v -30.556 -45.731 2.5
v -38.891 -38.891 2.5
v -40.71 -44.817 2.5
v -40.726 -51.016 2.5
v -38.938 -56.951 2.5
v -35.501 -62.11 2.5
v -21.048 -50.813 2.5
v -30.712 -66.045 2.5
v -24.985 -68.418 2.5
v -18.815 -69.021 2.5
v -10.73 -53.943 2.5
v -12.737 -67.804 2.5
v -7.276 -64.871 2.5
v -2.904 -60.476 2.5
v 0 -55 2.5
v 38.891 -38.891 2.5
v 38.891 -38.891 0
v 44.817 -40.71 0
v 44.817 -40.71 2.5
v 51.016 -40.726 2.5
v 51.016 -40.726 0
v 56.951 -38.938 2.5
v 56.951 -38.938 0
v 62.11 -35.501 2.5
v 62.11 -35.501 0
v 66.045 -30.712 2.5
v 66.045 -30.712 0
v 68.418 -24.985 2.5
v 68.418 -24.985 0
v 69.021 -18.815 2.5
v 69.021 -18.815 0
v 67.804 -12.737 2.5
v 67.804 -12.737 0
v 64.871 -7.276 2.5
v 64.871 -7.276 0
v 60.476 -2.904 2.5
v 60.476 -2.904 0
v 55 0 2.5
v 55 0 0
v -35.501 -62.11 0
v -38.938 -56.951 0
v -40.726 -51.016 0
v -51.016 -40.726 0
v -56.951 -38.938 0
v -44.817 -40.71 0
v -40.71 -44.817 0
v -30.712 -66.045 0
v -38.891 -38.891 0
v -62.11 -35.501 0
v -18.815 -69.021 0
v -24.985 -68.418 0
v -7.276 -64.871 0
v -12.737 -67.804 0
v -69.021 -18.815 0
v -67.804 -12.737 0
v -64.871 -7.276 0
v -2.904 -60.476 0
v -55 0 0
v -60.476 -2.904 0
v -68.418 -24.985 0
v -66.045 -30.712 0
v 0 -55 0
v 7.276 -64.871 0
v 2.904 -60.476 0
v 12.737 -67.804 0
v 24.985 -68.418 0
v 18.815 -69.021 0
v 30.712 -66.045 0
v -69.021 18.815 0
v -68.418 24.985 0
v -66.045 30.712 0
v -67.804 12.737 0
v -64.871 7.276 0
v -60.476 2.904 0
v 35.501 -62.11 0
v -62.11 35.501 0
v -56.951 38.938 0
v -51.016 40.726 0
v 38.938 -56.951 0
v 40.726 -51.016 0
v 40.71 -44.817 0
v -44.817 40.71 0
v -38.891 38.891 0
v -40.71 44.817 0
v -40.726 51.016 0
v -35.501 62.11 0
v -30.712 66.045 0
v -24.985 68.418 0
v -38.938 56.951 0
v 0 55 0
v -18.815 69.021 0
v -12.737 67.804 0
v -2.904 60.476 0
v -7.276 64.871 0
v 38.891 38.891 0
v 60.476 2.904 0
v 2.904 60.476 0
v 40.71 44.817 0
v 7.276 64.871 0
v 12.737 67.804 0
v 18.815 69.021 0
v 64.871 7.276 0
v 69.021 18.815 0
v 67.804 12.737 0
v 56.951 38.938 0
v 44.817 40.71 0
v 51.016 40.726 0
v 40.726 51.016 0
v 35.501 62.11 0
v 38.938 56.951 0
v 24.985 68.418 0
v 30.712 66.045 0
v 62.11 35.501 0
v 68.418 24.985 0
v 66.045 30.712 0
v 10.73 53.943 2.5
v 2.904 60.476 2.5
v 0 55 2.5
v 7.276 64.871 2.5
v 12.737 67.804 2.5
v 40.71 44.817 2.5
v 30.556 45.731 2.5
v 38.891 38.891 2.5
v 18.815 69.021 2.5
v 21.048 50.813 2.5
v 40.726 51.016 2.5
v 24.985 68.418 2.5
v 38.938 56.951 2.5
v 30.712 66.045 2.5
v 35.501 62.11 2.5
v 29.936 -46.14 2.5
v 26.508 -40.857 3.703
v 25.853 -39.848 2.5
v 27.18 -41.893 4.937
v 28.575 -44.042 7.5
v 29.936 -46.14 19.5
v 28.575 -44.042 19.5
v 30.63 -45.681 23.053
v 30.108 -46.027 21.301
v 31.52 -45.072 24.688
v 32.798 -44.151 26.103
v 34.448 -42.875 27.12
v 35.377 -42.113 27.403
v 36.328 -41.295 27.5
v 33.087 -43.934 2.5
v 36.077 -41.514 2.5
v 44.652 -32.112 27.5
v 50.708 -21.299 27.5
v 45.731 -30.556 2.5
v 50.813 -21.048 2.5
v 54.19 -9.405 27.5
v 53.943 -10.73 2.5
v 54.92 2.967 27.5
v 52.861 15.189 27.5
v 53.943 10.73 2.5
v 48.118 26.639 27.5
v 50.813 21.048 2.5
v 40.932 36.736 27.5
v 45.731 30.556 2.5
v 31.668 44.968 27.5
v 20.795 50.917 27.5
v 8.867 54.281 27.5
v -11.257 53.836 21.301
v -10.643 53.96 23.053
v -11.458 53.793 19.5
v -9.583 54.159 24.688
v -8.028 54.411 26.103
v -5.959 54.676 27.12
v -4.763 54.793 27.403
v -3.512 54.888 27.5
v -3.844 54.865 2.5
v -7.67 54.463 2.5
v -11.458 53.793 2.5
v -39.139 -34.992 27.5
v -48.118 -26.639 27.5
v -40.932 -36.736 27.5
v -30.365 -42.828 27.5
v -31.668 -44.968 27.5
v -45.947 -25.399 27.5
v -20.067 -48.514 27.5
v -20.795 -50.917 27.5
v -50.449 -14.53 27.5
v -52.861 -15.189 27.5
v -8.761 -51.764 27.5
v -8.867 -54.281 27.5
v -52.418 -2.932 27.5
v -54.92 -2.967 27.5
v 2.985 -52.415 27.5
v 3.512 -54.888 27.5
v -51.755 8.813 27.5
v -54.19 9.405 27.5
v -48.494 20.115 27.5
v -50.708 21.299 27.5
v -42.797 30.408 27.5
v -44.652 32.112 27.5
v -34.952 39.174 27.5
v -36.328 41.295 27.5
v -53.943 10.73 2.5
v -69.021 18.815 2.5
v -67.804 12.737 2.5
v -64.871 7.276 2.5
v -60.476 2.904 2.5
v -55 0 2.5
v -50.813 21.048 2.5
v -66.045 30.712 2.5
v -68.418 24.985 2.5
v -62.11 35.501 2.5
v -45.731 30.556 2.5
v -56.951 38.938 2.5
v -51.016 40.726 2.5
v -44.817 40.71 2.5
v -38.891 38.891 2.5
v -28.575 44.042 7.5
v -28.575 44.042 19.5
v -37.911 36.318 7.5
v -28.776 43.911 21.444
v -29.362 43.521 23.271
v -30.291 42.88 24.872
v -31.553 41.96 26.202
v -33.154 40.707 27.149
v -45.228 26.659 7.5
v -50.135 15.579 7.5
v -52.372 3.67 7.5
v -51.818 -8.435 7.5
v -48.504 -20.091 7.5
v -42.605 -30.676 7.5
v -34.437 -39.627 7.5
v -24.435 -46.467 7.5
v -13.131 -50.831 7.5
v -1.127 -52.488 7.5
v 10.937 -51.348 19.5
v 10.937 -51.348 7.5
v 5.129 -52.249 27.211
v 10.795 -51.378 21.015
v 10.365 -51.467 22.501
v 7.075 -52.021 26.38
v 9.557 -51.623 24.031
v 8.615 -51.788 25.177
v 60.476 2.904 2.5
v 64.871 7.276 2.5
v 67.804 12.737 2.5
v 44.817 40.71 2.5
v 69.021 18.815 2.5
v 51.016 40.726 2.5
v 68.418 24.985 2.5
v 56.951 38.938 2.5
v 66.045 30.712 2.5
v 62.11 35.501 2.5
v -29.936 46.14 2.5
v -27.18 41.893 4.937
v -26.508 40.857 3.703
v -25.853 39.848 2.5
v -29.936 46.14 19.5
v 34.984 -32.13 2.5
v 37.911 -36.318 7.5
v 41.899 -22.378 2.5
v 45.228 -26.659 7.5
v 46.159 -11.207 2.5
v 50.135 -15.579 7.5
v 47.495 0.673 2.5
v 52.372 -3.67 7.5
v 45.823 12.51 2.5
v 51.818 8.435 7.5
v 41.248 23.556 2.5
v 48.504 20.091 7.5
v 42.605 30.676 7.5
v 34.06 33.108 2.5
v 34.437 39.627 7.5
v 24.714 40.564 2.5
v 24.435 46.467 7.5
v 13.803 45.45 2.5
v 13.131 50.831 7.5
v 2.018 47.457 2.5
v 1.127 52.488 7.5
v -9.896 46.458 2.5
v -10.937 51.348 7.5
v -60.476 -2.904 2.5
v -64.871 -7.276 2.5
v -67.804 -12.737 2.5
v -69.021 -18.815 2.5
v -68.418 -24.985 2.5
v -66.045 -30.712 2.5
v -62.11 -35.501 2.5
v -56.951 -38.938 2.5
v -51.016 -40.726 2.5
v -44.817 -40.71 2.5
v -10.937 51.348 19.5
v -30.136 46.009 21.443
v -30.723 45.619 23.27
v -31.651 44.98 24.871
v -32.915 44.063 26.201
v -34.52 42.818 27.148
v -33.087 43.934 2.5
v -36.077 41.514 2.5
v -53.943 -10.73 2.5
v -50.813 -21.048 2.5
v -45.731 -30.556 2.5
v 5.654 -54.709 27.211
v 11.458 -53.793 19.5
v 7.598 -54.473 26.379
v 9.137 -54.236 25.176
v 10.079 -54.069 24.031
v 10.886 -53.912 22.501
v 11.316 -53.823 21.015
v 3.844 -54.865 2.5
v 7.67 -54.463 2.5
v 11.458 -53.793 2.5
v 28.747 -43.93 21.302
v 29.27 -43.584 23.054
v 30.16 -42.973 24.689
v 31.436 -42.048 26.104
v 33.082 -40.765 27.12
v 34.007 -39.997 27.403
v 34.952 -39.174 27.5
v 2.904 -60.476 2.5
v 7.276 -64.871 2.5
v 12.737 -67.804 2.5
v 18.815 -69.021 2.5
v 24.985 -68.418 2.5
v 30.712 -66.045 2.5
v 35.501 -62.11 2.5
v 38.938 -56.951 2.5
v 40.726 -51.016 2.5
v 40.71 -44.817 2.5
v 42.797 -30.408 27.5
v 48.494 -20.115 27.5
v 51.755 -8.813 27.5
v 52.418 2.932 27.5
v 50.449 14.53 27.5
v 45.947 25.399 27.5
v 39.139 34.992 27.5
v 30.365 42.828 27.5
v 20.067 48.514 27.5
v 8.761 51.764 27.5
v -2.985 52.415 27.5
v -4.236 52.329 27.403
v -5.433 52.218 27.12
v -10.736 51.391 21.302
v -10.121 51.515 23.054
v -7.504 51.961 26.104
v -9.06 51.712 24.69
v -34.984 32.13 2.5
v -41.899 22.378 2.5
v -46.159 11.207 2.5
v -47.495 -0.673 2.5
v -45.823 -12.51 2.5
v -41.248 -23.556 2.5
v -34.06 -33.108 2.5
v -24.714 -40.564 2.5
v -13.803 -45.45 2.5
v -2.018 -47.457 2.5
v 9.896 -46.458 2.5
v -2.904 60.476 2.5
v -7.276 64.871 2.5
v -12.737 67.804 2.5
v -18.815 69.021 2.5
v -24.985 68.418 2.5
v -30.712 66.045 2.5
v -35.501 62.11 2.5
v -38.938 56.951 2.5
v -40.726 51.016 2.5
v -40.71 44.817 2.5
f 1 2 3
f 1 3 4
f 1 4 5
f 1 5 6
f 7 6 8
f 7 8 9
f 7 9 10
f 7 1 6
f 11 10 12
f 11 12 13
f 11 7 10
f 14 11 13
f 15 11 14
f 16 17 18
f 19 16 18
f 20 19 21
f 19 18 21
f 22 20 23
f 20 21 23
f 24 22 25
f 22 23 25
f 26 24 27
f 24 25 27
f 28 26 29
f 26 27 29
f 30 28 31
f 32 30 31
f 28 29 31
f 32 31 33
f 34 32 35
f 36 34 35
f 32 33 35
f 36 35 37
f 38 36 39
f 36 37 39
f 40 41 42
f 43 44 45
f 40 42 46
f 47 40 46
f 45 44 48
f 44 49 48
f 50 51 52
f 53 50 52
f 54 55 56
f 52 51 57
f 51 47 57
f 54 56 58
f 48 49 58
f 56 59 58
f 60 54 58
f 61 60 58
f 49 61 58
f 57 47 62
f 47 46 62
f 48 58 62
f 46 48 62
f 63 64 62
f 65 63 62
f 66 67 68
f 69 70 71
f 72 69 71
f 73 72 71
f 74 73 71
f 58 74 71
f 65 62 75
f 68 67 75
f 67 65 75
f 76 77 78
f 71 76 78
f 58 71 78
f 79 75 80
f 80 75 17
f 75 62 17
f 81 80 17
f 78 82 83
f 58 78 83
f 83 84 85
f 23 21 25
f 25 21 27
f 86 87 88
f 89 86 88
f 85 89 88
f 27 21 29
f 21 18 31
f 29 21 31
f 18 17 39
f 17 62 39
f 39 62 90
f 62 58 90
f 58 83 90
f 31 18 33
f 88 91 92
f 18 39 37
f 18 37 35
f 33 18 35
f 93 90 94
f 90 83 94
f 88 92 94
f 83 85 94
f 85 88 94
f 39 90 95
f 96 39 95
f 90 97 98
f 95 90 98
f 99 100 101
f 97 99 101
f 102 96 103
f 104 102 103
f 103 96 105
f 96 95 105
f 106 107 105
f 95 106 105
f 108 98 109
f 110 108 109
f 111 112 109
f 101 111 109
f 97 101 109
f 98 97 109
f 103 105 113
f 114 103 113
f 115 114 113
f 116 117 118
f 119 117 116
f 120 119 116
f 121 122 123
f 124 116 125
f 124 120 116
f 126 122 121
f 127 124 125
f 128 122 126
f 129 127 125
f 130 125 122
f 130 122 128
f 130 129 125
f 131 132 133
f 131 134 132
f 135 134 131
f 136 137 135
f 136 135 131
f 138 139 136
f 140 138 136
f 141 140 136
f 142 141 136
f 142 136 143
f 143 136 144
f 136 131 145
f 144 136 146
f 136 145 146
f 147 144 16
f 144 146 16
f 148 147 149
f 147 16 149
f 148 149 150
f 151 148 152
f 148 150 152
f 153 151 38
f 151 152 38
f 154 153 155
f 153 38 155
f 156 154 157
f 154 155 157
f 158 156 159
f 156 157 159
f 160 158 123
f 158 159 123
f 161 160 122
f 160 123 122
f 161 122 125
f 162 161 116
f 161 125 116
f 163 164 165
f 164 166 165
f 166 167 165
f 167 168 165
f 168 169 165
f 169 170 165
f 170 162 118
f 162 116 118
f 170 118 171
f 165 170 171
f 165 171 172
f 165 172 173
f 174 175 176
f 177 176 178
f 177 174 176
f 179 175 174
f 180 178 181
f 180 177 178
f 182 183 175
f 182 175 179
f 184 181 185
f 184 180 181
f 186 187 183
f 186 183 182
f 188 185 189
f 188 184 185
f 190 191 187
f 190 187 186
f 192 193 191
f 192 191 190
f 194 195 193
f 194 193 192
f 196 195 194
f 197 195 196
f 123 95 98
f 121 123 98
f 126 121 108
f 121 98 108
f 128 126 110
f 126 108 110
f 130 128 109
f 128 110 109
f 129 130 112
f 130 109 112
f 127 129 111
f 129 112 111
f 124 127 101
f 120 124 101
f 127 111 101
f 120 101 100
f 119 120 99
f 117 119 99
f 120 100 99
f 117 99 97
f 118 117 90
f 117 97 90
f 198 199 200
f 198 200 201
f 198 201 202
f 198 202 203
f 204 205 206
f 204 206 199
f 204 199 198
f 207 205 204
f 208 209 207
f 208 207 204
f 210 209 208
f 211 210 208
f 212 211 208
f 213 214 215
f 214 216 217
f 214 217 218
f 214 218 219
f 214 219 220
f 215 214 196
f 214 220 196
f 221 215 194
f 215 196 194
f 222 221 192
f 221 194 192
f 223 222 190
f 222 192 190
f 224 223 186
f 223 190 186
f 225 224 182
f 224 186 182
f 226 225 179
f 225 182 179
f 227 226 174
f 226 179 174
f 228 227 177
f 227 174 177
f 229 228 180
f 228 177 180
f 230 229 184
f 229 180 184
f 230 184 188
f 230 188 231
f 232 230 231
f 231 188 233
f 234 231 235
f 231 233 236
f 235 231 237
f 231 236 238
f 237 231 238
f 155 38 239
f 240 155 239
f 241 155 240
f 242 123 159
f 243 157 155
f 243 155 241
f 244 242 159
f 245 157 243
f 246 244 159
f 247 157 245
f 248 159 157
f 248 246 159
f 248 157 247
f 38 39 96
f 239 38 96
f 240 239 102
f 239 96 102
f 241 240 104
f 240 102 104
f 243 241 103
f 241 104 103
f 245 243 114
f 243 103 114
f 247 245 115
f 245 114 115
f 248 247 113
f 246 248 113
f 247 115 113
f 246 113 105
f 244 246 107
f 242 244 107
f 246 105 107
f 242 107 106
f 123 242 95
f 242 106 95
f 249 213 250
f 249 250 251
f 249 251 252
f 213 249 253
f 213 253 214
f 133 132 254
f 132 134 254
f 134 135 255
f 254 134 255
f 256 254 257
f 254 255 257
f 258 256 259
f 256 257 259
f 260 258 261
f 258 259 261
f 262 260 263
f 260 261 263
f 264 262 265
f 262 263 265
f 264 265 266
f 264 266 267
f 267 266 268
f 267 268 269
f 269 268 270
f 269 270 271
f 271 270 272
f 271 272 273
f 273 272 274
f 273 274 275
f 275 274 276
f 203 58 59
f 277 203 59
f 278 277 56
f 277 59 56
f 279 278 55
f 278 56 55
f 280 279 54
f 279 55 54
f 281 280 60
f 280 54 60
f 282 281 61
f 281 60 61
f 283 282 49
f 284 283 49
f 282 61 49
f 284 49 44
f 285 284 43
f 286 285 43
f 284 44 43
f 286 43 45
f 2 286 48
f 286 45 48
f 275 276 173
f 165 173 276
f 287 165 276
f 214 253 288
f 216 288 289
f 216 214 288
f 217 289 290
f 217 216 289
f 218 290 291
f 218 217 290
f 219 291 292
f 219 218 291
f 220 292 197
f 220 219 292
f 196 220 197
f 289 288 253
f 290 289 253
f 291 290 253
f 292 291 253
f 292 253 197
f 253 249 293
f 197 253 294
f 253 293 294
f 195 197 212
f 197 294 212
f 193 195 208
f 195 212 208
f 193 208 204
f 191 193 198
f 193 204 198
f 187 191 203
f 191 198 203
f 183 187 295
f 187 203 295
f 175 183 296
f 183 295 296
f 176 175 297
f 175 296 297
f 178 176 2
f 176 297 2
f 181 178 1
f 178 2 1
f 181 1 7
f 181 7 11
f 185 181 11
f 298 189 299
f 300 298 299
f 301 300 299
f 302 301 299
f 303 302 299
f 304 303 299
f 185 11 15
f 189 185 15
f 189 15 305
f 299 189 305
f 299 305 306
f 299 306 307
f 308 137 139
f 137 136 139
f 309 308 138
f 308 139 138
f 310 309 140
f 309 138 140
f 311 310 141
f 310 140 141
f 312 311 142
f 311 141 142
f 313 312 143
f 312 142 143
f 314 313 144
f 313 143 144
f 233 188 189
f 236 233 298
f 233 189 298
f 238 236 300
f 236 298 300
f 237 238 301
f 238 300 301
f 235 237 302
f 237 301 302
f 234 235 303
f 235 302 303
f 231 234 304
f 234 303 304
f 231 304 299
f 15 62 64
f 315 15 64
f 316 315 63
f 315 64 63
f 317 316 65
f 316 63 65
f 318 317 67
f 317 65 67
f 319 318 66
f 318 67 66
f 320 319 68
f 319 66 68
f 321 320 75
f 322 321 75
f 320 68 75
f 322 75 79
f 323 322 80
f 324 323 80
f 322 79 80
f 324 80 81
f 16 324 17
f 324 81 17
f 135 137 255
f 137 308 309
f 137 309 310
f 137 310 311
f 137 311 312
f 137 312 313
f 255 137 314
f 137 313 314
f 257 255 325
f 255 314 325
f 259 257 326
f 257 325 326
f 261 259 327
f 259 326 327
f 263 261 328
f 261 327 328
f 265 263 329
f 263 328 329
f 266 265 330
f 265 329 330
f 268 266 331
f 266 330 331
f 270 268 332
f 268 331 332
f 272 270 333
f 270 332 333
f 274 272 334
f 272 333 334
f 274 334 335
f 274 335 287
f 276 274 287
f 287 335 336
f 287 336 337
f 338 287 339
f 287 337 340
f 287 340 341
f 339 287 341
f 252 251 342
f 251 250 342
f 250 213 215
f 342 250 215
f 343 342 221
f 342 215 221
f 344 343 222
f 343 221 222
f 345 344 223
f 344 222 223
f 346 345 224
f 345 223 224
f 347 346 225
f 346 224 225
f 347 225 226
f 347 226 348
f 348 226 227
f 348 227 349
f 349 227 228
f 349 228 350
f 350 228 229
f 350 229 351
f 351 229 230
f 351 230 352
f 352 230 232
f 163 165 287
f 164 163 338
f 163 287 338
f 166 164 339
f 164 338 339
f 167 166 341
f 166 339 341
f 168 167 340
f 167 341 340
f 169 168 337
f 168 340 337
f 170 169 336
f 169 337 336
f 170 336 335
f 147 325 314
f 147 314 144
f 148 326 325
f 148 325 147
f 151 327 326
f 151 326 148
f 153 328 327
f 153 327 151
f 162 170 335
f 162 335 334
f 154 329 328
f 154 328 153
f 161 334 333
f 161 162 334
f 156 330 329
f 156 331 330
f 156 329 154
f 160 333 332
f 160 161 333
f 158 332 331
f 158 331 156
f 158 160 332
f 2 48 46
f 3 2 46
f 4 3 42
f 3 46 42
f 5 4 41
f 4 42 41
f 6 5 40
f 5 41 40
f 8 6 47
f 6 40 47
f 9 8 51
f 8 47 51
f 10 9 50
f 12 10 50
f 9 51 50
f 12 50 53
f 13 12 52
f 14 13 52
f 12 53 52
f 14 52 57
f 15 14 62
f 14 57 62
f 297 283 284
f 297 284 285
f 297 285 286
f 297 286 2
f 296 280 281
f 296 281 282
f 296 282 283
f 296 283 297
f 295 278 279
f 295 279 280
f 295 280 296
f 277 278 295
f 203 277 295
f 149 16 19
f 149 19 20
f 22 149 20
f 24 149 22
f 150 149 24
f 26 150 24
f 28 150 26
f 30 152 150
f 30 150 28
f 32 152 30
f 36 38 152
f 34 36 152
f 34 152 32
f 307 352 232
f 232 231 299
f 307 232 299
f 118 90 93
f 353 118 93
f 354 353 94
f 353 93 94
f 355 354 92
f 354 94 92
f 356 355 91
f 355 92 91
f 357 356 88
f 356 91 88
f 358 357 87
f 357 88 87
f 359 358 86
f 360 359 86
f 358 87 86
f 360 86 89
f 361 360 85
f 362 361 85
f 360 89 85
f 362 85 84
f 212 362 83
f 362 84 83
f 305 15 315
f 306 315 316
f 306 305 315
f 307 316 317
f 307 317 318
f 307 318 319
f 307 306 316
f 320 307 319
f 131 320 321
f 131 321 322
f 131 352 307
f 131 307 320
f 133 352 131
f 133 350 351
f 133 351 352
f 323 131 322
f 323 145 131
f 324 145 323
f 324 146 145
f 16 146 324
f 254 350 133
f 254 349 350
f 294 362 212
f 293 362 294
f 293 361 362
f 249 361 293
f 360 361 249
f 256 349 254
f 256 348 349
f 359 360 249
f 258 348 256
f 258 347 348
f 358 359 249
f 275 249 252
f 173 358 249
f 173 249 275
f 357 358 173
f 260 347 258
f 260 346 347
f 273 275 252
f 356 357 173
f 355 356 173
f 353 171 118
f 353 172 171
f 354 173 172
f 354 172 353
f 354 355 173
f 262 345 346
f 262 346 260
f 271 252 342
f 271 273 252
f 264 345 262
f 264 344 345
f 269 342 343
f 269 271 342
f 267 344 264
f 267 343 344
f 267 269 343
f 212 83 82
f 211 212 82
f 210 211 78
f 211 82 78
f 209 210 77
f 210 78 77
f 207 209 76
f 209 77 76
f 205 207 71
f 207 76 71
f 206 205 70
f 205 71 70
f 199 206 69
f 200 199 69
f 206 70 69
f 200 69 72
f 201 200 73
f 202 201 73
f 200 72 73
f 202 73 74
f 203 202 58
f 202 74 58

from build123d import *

# Parameters (mm, degrees)
PAD001_DEPTH = 2.5
SKETCH_R     = 55
PAD_DEPTH    = 25
POCKET_DEPTH = 25
FILLET_R     = 8
CHAMFER_SIZE = 5


with BuildPart() as part:
    # Sketch001 → Pad001 (new body)
    with BuildSketch(Plane.XY):
        with BuildLine():
            ThreePointArc((38.890873, 38.890873), (27.935891, 67.443206), (0, 55))
            ThreePointArc((0, 55), (-27.935891, 67.443206), (-38.890873, 38.890873))
            ThreePointArc((-38.890873, 38.890873), (-67.443206, 27.935891), (-55, 0))
            ThreePointArc((-55, 0), (-67.443206, -27.935891), (-38.890873, -38.890873))
            ThreePointArc((-38.890873, -38.890873), (-27.935891, -67.443206), (0, -55))
            ThreePointArc((0, -55), (27.935891, -67.443206), (38.890873, -38.890873))
            ThreePointArc((38.890873, -38.890873), (67.443206, -27.935891), (55, 0))
            ThreePointArc((55, 0), (67.443206, 27.935891), (38.890873, 38.890873))
        make_face()
    extrude(amount=PAD001_DEPTH)

    # Sketch (on Face10 of Pad001) → Pad (join)
    with BuildSketch(Plane.XY.offset(2.5)):
        Circle(SKETCH_R)
    extrude(amount=PAD_DEPTH)

    # Sketch002 (on Face19 of Pad) → Pocket (cut)
    with BuildSketch(Plane.XY.offset(27.5)):
        with BuildLine():
            Line((10.937159, -51.348112), (11.457976, -53.79326))
            ThreePointArc((11.457976, -53.79326), (21.047589, -50.813374), (29.935566, -46.139591))
            Line((28.574859, -44.042337), (29.935566, -46.139591))
            ThreePointArc((28.574859, -44.042337), (48.503675, 20.09088), (-10.937159, 51.348112))
            Line((-11.457976, 53.79326), (-10.937159, 51.348112))
            ThreePointArc((-11.457976, 53.79326), (-21.047589, 50.813374), (-29.935566, 46.139591))
            Line((-29.935566, 46.139591), (-28.574859, 44.042337))
            ThreePointArc((-28.574859, 44.042337), (-48.503675, -20.09088), (10.937159, -51.348112))
        make_face()
    extrude(amount=-POCKET_DEPTH, mode=Mode.SUBTRACT)

    # Fillet
    fillet_edges = [part.edges().sort_by_distance(p)[0] for p in [
        (-29.255213, 45.090964, 27.5),
        (-11.197567, 52.570686, 27.5),
        (11.197567, -52.570686, 27.5),
        (29.255213, -45.090964, 27.5),
    ]]
    fillet(fillet_edges, radius=FILLET_R)

    # Chamfer
    chamfer_edges = [part.edges().sort_by_distance(p)[0] for p in [
        (-48.503675, -20.09088, 2.5),
        (48.503675, 20.09088, 2.5),
    ]]
    chamfer(chamfer_edges, length=CHAMFER_SIZE)


solid = part.part
